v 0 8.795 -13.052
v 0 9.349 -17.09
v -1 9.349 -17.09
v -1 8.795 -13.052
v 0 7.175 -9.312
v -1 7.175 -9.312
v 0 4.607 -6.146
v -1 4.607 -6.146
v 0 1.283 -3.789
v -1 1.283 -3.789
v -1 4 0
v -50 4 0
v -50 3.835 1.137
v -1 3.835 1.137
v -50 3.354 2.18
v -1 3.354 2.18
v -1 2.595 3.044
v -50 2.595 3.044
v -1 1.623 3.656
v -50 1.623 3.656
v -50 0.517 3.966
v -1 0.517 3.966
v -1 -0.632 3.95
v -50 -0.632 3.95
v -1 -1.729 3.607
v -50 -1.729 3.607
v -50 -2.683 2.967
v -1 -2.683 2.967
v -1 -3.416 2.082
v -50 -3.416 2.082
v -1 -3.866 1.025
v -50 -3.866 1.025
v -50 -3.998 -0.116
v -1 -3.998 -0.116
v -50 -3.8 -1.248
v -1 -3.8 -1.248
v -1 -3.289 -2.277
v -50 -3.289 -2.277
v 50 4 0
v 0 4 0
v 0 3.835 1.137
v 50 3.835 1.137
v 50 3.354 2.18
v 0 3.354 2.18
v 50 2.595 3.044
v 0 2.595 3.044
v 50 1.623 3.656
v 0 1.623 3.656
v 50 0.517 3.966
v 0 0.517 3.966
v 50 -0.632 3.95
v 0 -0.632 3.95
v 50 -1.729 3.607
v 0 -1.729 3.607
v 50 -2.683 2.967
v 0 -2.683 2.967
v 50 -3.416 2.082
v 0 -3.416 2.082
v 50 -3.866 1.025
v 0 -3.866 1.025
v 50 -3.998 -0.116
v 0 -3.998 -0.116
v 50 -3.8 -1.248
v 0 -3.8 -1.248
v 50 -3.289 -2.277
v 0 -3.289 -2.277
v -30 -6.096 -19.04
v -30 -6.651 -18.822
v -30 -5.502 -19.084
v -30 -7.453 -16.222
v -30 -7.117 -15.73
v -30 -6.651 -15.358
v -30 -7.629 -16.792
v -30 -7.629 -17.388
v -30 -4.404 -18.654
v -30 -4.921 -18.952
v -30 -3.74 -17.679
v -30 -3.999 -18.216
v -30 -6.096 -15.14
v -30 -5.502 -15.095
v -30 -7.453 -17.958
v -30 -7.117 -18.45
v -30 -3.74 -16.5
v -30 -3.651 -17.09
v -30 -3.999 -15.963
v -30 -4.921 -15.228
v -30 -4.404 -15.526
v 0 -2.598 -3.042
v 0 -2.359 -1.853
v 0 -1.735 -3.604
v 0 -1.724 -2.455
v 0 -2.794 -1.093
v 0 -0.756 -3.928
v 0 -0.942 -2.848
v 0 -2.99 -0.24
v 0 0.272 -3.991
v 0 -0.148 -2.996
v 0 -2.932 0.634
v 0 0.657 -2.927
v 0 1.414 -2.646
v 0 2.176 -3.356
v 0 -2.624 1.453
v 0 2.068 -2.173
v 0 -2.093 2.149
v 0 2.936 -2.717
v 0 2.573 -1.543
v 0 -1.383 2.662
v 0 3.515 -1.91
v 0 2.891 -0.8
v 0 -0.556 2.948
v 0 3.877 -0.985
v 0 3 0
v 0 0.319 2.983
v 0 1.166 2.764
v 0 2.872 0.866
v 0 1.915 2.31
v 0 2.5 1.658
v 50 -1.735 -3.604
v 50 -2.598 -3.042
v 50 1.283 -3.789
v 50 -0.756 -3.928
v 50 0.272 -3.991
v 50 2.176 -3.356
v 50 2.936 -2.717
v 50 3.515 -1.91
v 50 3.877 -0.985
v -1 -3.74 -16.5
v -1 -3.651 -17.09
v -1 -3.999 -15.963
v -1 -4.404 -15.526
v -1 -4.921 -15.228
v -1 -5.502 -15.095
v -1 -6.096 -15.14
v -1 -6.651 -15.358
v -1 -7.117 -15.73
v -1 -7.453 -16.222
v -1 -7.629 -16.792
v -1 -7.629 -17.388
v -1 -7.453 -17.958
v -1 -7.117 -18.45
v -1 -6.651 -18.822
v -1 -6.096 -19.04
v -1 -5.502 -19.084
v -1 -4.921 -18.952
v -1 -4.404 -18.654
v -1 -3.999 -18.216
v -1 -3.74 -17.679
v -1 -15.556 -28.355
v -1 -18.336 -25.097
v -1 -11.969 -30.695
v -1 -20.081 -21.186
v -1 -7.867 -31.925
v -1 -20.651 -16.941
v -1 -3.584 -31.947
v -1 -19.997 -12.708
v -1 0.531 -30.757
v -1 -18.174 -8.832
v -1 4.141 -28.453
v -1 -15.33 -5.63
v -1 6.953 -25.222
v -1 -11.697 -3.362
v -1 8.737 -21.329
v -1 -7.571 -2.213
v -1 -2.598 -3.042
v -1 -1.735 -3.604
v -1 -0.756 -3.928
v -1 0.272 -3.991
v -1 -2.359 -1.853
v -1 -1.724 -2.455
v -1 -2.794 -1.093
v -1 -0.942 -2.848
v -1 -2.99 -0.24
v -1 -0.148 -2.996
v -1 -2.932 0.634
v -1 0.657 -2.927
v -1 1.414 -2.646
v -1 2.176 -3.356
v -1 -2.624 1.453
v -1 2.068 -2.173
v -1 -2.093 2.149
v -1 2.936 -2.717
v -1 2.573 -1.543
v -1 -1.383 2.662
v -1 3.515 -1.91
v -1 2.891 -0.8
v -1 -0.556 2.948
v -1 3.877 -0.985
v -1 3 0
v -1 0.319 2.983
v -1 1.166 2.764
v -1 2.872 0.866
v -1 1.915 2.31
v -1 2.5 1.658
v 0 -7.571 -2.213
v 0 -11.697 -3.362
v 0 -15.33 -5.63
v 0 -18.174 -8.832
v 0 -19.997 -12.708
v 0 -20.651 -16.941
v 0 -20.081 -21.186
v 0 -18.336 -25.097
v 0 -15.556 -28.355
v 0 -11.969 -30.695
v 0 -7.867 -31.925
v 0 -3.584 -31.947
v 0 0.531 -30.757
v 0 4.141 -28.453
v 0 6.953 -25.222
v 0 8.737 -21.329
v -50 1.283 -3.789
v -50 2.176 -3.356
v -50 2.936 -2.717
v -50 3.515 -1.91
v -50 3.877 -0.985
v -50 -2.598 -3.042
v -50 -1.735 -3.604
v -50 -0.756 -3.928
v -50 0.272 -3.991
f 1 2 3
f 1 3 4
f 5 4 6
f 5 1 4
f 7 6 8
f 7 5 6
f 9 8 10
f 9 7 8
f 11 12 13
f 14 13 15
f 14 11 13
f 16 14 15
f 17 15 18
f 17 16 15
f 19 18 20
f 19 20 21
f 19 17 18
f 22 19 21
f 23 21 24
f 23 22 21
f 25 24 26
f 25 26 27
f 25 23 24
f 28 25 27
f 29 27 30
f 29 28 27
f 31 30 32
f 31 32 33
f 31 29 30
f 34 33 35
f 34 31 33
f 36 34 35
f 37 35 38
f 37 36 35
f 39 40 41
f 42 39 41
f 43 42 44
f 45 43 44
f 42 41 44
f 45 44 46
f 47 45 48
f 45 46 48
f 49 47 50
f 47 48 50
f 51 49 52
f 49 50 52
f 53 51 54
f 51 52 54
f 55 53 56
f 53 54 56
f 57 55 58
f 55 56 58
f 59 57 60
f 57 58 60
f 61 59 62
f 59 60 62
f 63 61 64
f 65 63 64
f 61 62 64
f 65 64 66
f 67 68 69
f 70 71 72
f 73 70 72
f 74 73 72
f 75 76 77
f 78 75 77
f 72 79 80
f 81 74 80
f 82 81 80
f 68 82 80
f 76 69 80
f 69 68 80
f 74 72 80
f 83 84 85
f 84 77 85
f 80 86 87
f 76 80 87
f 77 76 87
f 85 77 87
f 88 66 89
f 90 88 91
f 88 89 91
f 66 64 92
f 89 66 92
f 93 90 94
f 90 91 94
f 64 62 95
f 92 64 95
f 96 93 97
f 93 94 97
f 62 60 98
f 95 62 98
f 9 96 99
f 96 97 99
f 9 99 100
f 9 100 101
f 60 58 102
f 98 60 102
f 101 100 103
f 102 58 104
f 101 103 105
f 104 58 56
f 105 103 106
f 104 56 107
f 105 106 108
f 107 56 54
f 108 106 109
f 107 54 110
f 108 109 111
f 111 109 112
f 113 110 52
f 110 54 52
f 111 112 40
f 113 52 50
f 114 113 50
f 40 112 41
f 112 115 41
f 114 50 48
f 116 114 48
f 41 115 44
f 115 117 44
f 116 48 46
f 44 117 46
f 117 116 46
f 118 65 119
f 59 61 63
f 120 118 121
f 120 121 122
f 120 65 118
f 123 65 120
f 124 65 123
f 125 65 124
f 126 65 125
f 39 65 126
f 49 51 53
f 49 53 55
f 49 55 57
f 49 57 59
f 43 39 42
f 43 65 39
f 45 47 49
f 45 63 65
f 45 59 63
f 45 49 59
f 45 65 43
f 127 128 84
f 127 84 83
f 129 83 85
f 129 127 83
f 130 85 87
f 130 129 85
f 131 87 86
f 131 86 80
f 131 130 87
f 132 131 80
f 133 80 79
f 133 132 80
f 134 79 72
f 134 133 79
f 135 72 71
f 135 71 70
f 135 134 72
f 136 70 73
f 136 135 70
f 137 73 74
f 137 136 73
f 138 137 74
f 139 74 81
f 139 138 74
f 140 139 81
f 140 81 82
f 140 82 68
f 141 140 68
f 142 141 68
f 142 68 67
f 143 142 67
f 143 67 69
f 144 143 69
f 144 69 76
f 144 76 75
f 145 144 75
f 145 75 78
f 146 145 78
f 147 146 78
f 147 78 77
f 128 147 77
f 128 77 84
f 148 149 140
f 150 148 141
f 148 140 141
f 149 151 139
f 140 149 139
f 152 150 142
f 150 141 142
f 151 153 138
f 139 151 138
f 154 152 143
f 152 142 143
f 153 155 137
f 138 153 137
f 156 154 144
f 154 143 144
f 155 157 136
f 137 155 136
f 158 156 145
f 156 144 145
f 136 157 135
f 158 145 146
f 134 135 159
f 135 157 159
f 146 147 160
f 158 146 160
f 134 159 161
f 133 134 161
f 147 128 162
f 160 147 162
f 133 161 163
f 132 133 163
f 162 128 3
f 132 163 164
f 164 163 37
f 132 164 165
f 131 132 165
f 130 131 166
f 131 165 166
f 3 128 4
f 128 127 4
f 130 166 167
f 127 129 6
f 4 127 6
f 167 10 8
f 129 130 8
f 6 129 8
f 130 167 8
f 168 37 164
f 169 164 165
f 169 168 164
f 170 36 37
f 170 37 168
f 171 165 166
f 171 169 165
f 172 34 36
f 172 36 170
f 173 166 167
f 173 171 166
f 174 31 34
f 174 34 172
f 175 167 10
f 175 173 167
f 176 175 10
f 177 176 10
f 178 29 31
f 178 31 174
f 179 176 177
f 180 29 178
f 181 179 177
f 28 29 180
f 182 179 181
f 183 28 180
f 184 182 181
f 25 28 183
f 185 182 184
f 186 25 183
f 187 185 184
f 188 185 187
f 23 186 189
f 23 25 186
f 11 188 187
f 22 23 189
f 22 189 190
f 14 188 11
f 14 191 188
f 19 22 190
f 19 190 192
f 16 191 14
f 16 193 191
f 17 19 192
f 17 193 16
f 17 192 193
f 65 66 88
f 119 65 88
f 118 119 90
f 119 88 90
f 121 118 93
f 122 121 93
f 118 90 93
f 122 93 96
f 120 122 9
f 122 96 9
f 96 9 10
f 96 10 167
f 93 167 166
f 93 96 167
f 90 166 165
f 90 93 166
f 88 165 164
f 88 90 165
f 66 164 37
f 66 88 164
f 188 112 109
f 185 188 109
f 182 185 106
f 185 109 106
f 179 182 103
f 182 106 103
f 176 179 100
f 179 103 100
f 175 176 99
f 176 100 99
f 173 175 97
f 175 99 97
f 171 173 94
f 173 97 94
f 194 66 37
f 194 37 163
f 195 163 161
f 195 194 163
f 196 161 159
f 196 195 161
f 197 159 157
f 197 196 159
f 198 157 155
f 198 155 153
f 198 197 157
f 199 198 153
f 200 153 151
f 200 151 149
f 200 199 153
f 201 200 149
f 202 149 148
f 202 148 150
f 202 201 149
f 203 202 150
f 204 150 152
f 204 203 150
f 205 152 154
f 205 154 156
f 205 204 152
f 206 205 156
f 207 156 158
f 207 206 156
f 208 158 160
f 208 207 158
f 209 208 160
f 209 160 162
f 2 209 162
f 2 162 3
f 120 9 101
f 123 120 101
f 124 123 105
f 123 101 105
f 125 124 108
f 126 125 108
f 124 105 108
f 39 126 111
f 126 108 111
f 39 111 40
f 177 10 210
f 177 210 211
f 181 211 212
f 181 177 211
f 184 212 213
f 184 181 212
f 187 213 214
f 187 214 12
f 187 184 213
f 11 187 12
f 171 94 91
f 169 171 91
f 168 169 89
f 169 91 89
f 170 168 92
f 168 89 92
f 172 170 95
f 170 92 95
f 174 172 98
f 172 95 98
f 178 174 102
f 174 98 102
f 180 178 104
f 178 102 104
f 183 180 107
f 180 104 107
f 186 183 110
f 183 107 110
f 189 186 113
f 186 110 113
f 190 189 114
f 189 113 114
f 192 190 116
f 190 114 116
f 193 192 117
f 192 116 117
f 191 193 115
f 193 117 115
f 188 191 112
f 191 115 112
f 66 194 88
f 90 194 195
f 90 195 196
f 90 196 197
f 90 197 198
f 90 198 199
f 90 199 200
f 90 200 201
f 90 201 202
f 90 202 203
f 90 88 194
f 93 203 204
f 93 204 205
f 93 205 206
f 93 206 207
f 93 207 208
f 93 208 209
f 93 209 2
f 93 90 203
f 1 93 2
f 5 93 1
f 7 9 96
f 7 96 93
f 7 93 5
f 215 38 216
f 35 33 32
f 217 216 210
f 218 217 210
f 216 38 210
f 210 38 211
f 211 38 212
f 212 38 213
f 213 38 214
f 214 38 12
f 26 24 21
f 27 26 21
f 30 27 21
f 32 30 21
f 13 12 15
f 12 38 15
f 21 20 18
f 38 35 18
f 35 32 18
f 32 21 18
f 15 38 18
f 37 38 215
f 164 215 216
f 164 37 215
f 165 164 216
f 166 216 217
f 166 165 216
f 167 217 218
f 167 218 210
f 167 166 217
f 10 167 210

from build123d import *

# Parameters (mm, degrees)
F1_DEPTH      = 50
F1_DEPTH_BACK = 50
F2_DEPTH      = 1
F0_R          = 2
F3_DEPTH      = 1
F4_DEPTH      = 30


with BuildPart() as f1:
    # F0 (on Right) → F1 (new body, two sides)
    with BuildSketch(Plane.YZ) as f1_sk:
        with BuildLine():
            ThreePointArc((1.2827379971, -3.7887442815), (3.250457813, -2.3312065558), (4, 0))
            ThreePointArc((4, 0), (-1.1928211206, 3.8180070422), (-3.2885888871, -2.2770997192))
            ThreePointArc((-3.2885888871, -2.2770997192), (-2.1037180265, -2.5153956948), (-0.9418779147, -2.848309322))
            ThreePointArc((-0.9418779147, -2.848309322), (0.1893888641, -3.2736793631), (1.2827379971, -3.7887442815))
        make_face()
        with BuildLine():
            ThreePointArc((3, 0), (1.7570381692, -2.4316284404), (-0.9418779147, -2.848309322))
            ThreePointArc((-0.9418779147, -2.848309322), (-1.7570381692, 2.4316284404), (3, 0))
        make_face(mode=Mode.SUBTRACT)
        with BuildLine():
            ThreePointArc((3, 0), (-1.7570381692, 2.4316284404), (-0.9418779147, -2.848309322))
            ThreePointArc((-0.9418779147, -2.848309322), (1.7570381692, -2.4316284404), (3, 0))
        make_face()
        with BuildLine():
            ThreePointArc((-0.9418779147, -2.848309322), (-2.1037180265, -2.5153956948), (-3.2885888871, -2.2770997192))
            ThreePointArc((-3.2885888871, -2.2770997192), (-1.255837079, -3.7977458092), (1.2827379971, -3.7887442815))
            ThreePointArc((1.2827379971, -3.7887442815), (0.1893888641, -3.2736793631), (-0.9418779147, -2.848309322))
        make_face()
    extrude(amount=F1_DEPTH)
    extrude(f1_sk.sketch, amount=-F1_DEPTH_BACK)

    # F0 (on Right) → F2 (cut)
    with BuildSketch(Plane.YZ):
        with BuildLine():
            ThreePointArc((1.2827379971, -3.7887442815), (3.250457813, -2.3312065558), (4, 0))
            ThreePointArc((4, 0), (-1.1928211206, 3.8180070422), (-3.2885888871, -2.2770997192))
            ThreePointArc((-3.2885888871, -2.2770997192), (-2.1037180265, -2.5153956948), (-0.9418779147, -2.848309322))
            ThreePointArc((-0.9418779147, -2.848309322), (0.1893888641, -3.2736793631), (1.2827379971, -3.7887442815))
        make_face()
        with BuildLine():
            ThreePointArc((3, 0), (1.7570381692, -2.4316284404), (-0.9418779147, -2.848309322))
            ThreePointArc((-0.9418779147, -2.848309322), (-1.7570381692, 2.4316284404), (3, 0))
        make_face(mode=Mode.SUBTRACT)
        with BuildLine():
            ThreePointArc((-0.9418779147, -2.848309322), (-2.1037180265, -2.5153956948), (-3.2885888871, -2.2770997192))
            ThreePointArc((-3.2885888871, -2.2770997192), (-1.255837079, -3.7977458092), (1.2827379971, -3.7887442815))
            ThreePointArc((1.2827379971, -3.7887442815), (0.1893888641, -3.2736793631), (-0.9418779147, -2.848309322))
        make_face()
    extrude(amount=-F2_DEPTH, mode=Mode.SUBTRACT)


with BuildPart() as f3:
    # F0 (on Right) → F3 (new body)
    with BuildSketch(Plane.YZ):
        with BuildLine():
            ThreePointArc((1.2827379971, -3.7887442815), (-1.255837079, -3.7977458092), (-3.2885888871, -2.2770997192))
            ThreePointArc((-3.2885888871, -2.2770997192), (-17.0626683803, -26.8253538295), (9.3487331446, -17.0898561413))
            ThreePointArc((9.3487331446, -17.0898561413), (7.1746848205, -9.3120053066), (1.2827379971, -3.7887442815))
        make_face()
        with Locations((-5.6512668554, -17.0898561413)):
            Circle(F0_R, mode=Mode.SUBTRACT)
    extrude(amount=-F3_DEPTH)

    # F0 (on Right) → F4 (join)
    with BuildSketch(Plane.YZ):
        with Locations((-5.6512668554, -17.0898561413)):
            Circle(F0_R)
    extrude(amount=-F4_DEPTH)


solid = Compound([f1.part, f3.part])
